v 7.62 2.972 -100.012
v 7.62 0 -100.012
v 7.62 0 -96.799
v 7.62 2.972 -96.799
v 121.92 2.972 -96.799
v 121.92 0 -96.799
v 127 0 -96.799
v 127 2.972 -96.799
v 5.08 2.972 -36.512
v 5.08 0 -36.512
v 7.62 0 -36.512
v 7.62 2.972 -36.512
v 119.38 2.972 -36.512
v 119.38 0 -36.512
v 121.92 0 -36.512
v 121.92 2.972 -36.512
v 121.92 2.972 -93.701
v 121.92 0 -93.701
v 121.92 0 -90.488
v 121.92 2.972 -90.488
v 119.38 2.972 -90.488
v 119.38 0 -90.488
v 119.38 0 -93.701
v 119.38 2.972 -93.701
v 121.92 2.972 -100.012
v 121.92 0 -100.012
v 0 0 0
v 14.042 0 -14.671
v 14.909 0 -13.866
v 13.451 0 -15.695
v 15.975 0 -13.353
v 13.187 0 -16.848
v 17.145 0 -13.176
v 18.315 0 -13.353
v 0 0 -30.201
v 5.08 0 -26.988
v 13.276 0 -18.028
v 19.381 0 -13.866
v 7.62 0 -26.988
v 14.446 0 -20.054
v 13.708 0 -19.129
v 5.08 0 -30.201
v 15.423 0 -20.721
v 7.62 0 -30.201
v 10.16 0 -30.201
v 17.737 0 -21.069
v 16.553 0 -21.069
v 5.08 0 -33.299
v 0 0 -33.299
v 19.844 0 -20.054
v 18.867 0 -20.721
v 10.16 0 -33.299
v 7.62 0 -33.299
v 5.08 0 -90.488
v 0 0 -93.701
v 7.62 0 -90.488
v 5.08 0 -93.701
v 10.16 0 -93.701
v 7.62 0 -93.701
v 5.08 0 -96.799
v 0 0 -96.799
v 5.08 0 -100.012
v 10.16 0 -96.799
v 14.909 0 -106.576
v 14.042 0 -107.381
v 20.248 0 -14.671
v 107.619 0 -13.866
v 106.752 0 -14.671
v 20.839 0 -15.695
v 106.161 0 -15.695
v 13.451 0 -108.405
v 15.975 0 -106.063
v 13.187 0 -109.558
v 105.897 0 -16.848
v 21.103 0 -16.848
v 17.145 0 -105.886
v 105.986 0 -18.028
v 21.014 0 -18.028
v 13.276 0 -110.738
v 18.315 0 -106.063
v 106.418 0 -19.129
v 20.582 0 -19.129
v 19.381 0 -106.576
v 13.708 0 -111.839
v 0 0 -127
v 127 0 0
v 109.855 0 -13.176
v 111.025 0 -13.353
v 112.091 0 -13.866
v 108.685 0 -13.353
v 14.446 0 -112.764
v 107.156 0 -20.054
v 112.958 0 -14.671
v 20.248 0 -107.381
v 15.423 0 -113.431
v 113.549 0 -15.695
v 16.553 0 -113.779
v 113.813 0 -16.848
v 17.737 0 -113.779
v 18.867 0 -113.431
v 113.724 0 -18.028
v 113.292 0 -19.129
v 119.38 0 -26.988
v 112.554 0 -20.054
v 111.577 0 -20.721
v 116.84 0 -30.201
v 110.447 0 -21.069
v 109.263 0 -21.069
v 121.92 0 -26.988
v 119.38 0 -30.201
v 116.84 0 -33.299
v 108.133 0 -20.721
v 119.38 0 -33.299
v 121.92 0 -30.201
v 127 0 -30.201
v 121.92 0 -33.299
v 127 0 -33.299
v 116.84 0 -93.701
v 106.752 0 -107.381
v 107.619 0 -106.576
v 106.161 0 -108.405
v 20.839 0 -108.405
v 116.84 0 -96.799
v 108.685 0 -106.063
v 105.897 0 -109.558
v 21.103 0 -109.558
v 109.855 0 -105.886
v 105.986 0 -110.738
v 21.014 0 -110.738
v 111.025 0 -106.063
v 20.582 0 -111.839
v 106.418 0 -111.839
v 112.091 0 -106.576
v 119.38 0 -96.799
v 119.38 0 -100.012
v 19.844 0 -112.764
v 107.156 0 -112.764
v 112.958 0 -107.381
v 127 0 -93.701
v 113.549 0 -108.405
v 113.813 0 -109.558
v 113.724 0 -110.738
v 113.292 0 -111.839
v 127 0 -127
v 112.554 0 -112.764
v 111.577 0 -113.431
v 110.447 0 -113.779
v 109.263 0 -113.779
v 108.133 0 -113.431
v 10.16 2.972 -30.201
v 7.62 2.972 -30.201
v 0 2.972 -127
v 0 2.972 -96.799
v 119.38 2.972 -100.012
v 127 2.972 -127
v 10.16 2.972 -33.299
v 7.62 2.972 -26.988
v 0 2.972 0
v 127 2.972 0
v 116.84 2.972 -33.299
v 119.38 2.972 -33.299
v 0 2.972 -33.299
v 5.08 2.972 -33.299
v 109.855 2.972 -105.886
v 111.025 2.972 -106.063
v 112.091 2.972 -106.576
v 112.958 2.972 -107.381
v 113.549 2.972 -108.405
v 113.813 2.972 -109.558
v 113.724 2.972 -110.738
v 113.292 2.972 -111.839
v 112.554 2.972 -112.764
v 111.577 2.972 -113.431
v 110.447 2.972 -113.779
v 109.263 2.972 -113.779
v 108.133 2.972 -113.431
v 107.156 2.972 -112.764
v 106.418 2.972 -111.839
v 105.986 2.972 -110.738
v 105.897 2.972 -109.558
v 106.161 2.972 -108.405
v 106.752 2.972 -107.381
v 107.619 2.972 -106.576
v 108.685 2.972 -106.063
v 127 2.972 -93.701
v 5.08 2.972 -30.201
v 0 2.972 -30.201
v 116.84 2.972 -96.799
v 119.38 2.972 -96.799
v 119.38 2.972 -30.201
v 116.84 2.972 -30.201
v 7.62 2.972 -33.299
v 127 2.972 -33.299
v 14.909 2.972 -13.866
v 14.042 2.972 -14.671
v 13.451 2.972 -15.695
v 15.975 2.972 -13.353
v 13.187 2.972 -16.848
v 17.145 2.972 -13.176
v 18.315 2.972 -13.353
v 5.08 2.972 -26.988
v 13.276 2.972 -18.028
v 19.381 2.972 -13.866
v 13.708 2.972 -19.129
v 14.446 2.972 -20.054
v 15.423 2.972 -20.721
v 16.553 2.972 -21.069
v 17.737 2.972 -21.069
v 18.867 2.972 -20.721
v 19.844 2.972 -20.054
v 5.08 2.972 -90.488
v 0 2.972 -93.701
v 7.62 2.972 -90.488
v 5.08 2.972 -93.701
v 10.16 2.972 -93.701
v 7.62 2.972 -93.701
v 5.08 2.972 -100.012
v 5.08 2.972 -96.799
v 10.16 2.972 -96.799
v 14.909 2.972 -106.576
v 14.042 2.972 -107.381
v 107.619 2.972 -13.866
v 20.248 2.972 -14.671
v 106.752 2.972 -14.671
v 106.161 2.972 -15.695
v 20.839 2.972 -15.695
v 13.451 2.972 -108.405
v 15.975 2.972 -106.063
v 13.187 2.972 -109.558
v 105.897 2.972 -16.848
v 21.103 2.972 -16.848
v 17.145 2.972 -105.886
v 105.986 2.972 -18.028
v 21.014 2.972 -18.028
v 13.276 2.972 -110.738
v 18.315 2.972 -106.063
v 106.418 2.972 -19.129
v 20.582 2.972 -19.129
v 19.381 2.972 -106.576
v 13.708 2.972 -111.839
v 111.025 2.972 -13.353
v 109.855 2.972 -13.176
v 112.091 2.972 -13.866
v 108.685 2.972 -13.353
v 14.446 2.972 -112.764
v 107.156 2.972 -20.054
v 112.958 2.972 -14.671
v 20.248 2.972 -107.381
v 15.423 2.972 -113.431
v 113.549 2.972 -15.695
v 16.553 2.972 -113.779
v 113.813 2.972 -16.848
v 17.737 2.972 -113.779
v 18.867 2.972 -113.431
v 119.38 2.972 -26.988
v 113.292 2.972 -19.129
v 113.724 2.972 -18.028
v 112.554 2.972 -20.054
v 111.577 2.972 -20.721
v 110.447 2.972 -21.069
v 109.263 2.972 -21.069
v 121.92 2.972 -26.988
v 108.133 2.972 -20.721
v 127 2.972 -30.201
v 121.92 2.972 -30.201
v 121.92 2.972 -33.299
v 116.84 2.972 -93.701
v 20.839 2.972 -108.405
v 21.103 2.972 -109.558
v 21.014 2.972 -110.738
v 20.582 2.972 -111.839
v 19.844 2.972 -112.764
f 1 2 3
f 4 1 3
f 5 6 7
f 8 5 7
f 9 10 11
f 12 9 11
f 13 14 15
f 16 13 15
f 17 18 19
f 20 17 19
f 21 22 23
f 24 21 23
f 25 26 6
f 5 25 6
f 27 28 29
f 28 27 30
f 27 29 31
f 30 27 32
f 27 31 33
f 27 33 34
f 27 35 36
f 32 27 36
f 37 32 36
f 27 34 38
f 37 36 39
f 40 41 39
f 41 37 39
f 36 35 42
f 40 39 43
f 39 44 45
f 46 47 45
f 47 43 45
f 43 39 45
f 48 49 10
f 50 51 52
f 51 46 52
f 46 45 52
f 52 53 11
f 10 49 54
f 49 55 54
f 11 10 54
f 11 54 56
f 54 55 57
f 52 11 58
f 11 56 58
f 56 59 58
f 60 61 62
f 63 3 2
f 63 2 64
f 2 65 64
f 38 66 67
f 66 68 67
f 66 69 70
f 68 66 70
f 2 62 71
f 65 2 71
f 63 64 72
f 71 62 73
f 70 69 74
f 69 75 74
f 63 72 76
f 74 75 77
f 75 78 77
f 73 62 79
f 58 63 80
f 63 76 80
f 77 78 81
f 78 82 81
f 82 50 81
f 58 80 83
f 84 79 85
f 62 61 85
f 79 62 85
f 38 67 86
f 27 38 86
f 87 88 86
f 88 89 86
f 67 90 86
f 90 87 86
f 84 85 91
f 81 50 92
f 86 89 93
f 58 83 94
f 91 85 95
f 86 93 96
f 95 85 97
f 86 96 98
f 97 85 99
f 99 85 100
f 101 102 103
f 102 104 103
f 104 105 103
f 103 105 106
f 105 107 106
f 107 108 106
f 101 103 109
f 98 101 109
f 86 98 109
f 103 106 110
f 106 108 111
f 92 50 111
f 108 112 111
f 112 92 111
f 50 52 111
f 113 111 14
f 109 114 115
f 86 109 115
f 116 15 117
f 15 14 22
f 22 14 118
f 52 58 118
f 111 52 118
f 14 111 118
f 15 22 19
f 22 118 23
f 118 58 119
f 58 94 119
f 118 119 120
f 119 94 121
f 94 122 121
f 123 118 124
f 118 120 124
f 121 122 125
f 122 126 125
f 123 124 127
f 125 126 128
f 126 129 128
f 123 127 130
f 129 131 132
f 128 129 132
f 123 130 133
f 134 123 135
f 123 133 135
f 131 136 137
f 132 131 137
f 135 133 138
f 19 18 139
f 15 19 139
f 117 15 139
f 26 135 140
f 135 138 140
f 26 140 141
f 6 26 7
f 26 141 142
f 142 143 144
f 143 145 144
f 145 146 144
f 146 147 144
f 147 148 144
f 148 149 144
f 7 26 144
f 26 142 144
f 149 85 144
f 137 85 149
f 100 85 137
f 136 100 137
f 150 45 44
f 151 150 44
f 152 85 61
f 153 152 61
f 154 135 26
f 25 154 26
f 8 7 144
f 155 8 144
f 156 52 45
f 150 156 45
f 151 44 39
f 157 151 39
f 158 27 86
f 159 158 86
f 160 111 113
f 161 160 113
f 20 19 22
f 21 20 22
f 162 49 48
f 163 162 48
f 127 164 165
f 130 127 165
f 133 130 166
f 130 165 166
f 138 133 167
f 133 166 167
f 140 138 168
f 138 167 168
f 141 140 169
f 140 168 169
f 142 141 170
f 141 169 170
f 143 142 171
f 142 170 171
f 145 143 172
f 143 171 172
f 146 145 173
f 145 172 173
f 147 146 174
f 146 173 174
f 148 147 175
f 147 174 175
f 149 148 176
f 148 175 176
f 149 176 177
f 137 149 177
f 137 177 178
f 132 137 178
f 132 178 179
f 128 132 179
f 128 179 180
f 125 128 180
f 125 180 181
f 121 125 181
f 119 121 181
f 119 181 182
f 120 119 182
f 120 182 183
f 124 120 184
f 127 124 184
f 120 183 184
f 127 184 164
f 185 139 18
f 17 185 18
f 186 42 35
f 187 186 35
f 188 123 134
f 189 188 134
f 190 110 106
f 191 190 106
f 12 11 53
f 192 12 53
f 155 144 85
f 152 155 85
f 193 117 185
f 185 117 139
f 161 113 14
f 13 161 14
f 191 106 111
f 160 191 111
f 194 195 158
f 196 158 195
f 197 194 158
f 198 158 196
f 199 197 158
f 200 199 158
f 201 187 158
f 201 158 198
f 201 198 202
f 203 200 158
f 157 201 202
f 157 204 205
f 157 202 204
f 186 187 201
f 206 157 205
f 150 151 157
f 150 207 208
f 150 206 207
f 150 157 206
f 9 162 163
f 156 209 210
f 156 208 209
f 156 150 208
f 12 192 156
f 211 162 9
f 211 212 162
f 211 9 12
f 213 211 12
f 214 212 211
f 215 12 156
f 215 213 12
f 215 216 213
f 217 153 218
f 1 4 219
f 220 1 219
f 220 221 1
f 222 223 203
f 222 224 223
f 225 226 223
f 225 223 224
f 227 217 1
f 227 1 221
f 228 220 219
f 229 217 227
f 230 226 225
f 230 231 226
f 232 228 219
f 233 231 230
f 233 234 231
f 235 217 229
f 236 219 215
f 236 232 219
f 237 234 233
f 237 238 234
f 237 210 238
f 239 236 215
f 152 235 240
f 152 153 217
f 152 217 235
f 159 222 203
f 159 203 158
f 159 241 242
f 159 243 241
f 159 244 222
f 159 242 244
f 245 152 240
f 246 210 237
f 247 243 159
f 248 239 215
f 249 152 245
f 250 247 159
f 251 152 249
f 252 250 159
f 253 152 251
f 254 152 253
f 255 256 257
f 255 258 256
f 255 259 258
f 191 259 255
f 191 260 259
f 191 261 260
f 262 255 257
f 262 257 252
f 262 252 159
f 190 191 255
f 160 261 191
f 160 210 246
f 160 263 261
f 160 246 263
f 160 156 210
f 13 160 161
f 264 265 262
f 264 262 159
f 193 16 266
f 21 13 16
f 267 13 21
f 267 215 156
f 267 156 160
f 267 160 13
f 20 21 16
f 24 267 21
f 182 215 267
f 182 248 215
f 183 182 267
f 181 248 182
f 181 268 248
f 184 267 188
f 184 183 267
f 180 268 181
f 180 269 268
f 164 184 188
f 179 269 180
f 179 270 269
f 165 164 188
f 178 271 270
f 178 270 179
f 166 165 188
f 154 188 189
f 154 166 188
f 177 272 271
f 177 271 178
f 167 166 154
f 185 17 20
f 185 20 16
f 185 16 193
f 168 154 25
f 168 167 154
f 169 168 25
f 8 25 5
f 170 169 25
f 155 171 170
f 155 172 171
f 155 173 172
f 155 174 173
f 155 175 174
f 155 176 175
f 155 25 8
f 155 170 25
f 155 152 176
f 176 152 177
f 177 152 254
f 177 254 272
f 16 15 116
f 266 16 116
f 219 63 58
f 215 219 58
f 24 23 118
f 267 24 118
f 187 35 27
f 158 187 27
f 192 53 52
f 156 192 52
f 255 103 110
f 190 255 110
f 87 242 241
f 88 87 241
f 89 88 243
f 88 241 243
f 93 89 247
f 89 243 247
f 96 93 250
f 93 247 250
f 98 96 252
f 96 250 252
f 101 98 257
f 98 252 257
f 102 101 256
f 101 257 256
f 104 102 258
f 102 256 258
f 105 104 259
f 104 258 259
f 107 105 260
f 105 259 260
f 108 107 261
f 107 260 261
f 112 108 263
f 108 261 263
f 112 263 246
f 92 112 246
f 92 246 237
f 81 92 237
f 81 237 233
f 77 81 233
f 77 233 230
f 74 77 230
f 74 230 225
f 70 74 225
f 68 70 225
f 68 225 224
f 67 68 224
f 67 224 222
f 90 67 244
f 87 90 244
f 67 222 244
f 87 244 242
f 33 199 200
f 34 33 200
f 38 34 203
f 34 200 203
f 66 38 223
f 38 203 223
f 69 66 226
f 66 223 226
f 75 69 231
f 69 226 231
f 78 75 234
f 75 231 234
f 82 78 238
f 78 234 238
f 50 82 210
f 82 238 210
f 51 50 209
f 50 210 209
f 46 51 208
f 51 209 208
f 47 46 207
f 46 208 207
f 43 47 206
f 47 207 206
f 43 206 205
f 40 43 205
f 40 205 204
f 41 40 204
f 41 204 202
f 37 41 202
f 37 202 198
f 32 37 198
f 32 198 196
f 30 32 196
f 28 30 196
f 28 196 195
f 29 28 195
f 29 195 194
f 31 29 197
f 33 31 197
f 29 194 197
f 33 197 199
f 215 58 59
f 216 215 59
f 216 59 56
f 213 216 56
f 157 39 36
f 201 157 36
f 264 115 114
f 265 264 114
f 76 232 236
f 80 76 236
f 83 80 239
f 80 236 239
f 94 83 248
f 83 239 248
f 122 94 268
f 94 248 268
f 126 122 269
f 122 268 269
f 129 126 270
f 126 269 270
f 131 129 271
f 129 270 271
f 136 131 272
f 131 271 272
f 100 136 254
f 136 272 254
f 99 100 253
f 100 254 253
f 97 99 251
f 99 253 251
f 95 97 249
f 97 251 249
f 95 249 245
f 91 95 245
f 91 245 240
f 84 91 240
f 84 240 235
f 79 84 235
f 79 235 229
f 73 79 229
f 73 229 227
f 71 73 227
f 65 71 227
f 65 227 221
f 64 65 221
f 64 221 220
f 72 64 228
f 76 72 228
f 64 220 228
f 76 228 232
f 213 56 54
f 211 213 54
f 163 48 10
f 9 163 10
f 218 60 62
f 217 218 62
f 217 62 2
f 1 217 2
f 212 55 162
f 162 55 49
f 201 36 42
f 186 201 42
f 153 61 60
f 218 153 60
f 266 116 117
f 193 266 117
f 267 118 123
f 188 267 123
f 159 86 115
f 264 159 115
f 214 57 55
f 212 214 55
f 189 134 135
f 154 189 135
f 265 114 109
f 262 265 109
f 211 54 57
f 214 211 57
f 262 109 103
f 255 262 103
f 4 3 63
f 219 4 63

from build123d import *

# Parameters (mm, degrees)
BOSS_EXTRUDE1_DEPTH = 2.9718
SKETCH3_R           = 3.96875
CUT_EXTRUDE1_DEPTH  = 2.9718


with BuildPart() as part:
    # Sketch2 → Boss-Extrude1 (new body)
    with BuildSketch(Plane(origin=(0, 0, 0), x_dir=(1, 0, 0), z_dir=(0, 1, 0))):
        Polygon((0, 30.2006), (0, 0), (127, 0), (127, 30.2006), (121.92, 30.2006), (121.92, 26.9875), (119.38, 26.9875), (119.38, 30.2006), (116.84, 30.2006), (116.84, 33.2994), (119.38, 33.2994), (119.38, 36.5125), (121.92, 36.5125), (121.92, 33.2994), (127, 33.2994), (127, 63.5), (127, 93.7006), (121.92, 93.7006), (121.92, 90.4875), (119.38, 90.4875), (119.38, 93.7006), (116.84, 93.7006), (116.84, 96.7994), (119.38, 96.7994), (119.38, 100.0125), (121.92, 100.0125), (121.92, 96.7994), (127, 96.7994), (127, 127), (0, 127), (0, 96.7994), (5.08, 96.7994), (5.08, 100.0125), (7.62, 100.0125), (7.62, 96.7994), (10.16, 96.7994), (10.16, 93.7006), (7.62, 93.7006), (7.62, 90.4875), (5.08, 90.4875), (5.08, 93.7006), (0, 93.7006), (0, 63.5), (0, 33.2994), (5.08, 33.2994), (5.08, 36.5125), (7.62, 36.5125), (7.62, 33.2994), (10.16, 33.2994), (10.16, 30.2006), (7.62, 30.2006), (7.62, 26.9875), (5.08, 26.9875), (5.08, 30.2006), align=None)
    extrude(amount=BOSS_EXTRUDE1_DEPTH)

    # Sketch3 → Cut-Extrude1 (cut)
    with BuildSketch(Plane(origin=(0, 2.9718, 0), x_dir=(1, 0, 0), z_dir=(0, 1, 0))):
        with Locations(Location((17.145, 109.855, 0), (0, 0, 270))):
            Circle(SKETCH3_R)
        with Locations(Location((109.855, 109.855, 0), (0, 0, 270))):
            Circle(SKETCH3_R)
        with Locations(Location((109.855, 17.145, 0), (0, 0, 270))):
            Circle(SKETCH3_R)
        with Locations(Location((17.145, 17.145, 0), (0, 0, 270))):
            Circle(SKETCH3_R)
    extrude(amount=-CUT_EXTRUDE1_DEPTH, mode=Mode.SUBTRACT)


solid = part.part
